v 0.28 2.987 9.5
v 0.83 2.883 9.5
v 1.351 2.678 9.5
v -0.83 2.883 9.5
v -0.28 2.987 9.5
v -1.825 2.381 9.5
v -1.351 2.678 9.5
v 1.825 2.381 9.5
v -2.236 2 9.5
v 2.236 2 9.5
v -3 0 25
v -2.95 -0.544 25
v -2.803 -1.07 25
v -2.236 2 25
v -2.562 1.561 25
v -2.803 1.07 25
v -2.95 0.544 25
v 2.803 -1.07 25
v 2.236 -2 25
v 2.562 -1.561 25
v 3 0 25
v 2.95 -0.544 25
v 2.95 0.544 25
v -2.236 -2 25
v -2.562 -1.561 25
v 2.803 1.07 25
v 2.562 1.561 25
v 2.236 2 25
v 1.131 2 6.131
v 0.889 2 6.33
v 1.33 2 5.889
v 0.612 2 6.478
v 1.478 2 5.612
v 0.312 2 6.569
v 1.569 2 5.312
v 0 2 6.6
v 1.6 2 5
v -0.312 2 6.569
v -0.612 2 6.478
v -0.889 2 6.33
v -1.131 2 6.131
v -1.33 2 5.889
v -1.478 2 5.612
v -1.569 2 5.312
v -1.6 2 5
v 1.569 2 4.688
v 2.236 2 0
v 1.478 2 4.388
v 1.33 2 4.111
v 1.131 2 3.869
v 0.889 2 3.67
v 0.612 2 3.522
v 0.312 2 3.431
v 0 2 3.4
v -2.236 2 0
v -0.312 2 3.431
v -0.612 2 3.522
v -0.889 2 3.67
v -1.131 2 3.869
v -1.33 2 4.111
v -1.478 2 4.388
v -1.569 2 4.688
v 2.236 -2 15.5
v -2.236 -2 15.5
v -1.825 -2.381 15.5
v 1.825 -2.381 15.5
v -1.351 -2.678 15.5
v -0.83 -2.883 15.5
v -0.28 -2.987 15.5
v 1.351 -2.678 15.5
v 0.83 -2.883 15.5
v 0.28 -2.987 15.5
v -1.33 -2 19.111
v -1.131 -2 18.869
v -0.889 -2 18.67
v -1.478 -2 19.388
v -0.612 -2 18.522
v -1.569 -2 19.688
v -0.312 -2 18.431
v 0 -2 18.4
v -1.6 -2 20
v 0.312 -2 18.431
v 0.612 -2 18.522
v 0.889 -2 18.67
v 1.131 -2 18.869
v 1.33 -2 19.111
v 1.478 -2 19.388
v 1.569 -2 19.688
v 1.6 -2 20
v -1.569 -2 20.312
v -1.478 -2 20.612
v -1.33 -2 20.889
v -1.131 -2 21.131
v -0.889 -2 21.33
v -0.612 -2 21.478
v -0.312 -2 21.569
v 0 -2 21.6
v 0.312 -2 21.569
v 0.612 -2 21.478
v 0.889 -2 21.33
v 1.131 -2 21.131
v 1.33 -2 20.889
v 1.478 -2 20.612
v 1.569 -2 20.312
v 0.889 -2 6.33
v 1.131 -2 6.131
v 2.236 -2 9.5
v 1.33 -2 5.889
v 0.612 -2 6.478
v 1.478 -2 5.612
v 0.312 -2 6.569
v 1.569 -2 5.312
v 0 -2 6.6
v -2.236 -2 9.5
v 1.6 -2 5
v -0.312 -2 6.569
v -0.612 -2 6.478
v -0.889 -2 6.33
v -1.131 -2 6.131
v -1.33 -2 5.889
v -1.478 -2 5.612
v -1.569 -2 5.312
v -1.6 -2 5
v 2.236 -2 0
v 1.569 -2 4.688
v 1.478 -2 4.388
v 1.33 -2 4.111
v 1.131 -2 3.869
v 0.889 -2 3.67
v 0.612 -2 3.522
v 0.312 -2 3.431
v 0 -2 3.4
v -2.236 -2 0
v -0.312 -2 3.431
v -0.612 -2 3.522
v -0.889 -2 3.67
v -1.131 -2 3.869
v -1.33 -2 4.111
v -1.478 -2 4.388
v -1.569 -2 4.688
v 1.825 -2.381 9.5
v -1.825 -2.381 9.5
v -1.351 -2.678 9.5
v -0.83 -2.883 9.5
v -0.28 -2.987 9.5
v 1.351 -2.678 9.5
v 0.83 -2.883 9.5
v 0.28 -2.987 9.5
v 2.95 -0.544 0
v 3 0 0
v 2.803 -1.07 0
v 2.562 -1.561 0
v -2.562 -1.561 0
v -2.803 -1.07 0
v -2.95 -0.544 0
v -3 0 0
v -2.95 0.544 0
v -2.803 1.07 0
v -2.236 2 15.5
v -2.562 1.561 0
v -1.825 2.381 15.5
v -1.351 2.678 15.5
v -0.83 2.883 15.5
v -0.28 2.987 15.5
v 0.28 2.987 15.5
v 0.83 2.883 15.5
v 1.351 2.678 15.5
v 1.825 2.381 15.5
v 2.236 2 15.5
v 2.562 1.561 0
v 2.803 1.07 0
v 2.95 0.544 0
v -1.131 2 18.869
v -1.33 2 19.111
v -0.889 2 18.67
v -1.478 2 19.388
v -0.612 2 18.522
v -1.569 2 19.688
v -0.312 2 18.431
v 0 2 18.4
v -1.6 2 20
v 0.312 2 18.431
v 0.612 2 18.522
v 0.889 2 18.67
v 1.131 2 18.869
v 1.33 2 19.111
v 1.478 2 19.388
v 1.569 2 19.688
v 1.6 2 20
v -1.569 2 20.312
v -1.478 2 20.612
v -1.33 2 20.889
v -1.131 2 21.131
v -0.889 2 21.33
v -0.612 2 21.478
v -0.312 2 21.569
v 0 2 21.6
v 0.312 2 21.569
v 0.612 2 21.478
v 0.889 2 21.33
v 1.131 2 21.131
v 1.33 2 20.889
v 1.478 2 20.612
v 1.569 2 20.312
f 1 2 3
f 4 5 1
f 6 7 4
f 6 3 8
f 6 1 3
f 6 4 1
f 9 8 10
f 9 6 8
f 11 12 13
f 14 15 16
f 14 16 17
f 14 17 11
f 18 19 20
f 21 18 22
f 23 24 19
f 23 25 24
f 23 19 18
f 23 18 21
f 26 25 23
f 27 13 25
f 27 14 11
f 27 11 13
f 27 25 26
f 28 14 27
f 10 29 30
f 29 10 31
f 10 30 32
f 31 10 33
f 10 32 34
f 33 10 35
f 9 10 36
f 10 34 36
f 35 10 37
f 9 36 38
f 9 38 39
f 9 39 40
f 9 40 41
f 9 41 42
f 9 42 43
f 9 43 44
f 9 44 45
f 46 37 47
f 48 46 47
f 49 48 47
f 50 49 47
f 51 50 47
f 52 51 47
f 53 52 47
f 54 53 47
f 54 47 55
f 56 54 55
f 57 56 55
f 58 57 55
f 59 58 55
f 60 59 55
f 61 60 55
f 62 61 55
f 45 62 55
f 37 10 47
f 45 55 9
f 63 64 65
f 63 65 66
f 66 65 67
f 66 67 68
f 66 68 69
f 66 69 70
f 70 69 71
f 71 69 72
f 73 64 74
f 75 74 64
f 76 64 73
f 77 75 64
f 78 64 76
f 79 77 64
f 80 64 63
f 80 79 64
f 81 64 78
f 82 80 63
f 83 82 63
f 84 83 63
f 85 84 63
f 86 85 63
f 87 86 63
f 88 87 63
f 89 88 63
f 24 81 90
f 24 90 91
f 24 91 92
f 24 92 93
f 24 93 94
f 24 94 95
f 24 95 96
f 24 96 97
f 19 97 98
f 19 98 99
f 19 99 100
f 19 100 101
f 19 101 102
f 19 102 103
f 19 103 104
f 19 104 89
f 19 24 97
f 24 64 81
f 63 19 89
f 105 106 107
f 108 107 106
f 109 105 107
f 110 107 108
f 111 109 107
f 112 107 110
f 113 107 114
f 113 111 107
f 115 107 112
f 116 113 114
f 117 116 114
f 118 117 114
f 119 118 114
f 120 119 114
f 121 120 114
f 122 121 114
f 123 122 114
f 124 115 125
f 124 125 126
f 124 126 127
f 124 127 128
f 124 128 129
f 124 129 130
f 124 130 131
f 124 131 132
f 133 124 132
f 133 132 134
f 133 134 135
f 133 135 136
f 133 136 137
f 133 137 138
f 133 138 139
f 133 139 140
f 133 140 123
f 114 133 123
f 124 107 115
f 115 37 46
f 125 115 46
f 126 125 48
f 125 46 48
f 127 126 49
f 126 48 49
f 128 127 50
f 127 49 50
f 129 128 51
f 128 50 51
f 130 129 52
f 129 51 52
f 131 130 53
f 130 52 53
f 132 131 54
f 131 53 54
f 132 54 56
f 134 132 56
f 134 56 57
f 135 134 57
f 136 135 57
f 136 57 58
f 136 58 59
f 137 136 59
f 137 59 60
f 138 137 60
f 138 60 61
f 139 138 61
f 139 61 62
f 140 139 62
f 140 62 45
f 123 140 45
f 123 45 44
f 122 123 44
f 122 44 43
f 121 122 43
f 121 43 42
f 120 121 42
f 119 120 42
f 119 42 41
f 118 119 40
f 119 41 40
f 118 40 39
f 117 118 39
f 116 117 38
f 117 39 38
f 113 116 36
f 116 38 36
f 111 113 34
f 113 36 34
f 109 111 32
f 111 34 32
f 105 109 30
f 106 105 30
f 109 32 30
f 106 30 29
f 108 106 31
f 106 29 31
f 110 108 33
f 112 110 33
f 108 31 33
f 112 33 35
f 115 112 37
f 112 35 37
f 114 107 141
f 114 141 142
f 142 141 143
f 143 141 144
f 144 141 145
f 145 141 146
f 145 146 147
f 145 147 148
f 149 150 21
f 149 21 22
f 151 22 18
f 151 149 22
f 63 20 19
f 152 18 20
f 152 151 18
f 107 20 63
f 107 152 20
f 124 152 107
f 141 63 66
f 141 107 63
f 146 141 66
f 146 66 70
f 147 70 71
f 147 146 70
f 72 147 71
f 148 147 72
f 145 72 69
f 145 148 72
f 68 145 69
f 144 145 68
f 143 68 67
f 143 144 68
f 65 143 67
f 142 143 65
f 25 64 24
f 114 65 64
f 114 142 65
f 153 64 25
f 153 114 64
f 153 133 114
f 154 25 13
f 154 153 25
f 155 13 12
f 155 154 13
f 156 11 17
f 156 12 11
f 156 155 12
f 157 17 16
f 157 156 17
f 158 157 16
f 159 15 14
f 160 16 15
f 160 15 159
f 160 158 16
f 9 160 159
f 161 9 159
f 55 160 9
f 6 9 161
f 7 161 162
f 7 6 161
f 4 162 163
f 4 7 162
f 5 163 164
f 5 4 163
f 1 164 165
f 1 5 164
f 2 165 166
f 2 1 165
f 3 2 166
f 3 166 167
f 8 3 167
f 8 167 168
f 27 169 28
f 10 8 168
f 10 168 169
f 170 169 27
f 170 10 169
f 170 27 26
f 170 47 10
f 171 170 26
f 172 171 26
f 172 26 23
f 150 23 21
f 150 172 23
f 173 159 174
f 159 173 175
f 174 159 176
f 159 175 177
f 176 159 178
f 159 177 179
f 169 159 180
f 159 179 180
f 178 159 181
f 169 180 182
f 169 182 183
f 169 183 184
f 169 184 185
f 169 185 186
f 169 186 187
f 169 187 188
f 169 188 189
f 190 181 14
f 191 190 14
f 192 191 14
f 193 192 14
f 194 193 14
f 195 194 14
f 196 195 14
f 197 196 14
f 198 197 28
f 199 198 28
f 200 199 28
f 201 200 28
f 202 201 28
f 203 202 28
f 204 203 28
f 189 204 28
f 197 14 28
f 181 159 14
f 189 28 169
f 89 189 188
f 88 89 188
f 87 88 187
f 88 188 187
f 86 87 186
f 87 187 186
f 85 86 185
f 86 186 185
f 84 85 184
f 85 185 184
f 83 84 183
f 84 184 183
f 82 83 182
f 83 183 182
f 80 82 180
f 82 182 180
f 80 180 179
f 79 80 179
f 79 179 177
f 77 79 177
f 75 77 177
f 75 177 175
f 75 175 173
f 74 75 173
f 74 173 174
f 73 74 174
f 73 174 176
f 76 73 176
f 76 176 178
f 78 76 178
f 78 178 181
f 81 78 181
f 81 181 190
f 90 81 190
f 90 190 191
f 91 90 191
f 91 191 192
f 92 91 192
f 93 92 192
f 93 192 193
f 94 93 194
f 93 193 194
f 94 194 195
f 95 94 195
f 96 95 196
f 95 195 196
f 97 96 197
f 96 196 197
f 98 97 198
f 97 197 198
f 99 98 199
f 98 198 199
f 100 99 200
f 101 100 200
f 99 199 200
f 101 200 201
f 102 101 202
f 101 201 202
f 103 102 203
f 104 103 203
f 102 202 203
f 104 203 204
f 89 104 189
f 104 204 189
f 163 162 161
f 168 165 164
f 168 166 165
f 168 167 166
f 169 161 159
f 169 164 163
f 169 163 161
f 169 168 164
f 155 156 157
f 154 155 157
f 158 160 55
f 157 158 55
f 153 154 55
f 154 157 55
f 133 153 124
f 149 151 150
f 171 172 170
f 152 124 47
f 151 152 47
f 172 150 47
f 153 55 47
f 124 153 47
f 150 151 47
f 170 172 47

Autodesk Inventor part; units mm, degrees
ref_plane "YZ Plane" through (0, 0, 0) normal (1, 0, 0) x (0, 1, 0)
ref_plane "XZ Plane" through (0, 0, 0) normal (0, 1, 0) x (-1, 0, 0)
ref_plane "XY Plane" through (0, 0, 0) normal (0, 0, 1) x (1, 0, 0)
sketch "スケッチ1" plane through (0, 0, 0) normal (0, 0, 1) x (1, 0, 0)
  circle A0 centre (0, 0) radius 3
  dimension "d0" = 6
extrude "押し出し1" add sketch "スケッチ1" along normal blind 25
sketch "スケッチ2" plane through (0, 0, 25) normal (0, 0, 1) x (1, 0, 0)
  line L0 (-2.2832, 2) -> (2.2938, 2)
  line L1 (-2.2832, -2) -> (2.3454, -2)
  arc A0 (-2.2361, 2) -> (-2.2361, -2) centre (0, 0) ccw construction
  arc A1 (2.2361, 2) -> (-2.2361, 2) centre (0, 0) ccw
  arc A2 (2.2361, -2) -> (2.2361, 2) centre (0, 0) ccw construction
  arc A3 (-2.2361, -2) -> (2.2361, -2) centre (0, 0) ccw
  dimension "d5" = 2
  dimension "d6" = 6
  dimension "d7" = 2
extrude "押し出し2" cut sketch "スケッチ2" against normal blind 9.5
sketch "スケッチ3" plane through (0, 0, 0) normal (0, 0, -1) x (-1, 0, 0)
  arc A0 (-2.2361, -2) -> (2.2361, -2) centre (0, 0) ccw
  line L0 (-2.2361, 2) -> (2.2361, 2)
  line L1 (-2.2361, -2) -> (2.2361, -2)
  arc A1 (2.2361, -2) -> (2.2361, 2) centre (0, 0) ccw construction
  arc A2 (-2.2361, 2) -> (-2.2361, -2) centre (0, 0) ccw construction
  arc A3 (2.2361, 2) -> (-2.2361, 2) centre (0, 0) ccw
  arc A4 (2.2361, -2) -> (2.2361, 2) centre (0, 0) ccw construction
  dimension "d13" = 2
  dimension "d14" = 2
extrude "押し出し3" cut sketch "スケッチ3" against normal blind 9.5
sketch "スケッチ4" plane through (-2.2361, 2, 0) normal (0, 1, 0) x (1, 0, 0)
  circle A0 centre (2.2361, -5) radius 1.6
  circle A1 centre (2.2361, -20) radius 1.6
  line L0 (0, 0) -> (4.4721, 0) projected
  point P0 (2.2361, 0)
  point P1 (2.2361, 0)
  point P2 (2.2361, 0)
  dimension "d17" = 3.2
  dimension "d18" = 3.2
  dimension "d19" = 15
  dimension "d20" = 5
extrude "押し出し4" cut sketch "スケッチ4" against normal through all
properties part number "上昇機構_固定軸ベアリングの" material "アルミニウム 6061"
